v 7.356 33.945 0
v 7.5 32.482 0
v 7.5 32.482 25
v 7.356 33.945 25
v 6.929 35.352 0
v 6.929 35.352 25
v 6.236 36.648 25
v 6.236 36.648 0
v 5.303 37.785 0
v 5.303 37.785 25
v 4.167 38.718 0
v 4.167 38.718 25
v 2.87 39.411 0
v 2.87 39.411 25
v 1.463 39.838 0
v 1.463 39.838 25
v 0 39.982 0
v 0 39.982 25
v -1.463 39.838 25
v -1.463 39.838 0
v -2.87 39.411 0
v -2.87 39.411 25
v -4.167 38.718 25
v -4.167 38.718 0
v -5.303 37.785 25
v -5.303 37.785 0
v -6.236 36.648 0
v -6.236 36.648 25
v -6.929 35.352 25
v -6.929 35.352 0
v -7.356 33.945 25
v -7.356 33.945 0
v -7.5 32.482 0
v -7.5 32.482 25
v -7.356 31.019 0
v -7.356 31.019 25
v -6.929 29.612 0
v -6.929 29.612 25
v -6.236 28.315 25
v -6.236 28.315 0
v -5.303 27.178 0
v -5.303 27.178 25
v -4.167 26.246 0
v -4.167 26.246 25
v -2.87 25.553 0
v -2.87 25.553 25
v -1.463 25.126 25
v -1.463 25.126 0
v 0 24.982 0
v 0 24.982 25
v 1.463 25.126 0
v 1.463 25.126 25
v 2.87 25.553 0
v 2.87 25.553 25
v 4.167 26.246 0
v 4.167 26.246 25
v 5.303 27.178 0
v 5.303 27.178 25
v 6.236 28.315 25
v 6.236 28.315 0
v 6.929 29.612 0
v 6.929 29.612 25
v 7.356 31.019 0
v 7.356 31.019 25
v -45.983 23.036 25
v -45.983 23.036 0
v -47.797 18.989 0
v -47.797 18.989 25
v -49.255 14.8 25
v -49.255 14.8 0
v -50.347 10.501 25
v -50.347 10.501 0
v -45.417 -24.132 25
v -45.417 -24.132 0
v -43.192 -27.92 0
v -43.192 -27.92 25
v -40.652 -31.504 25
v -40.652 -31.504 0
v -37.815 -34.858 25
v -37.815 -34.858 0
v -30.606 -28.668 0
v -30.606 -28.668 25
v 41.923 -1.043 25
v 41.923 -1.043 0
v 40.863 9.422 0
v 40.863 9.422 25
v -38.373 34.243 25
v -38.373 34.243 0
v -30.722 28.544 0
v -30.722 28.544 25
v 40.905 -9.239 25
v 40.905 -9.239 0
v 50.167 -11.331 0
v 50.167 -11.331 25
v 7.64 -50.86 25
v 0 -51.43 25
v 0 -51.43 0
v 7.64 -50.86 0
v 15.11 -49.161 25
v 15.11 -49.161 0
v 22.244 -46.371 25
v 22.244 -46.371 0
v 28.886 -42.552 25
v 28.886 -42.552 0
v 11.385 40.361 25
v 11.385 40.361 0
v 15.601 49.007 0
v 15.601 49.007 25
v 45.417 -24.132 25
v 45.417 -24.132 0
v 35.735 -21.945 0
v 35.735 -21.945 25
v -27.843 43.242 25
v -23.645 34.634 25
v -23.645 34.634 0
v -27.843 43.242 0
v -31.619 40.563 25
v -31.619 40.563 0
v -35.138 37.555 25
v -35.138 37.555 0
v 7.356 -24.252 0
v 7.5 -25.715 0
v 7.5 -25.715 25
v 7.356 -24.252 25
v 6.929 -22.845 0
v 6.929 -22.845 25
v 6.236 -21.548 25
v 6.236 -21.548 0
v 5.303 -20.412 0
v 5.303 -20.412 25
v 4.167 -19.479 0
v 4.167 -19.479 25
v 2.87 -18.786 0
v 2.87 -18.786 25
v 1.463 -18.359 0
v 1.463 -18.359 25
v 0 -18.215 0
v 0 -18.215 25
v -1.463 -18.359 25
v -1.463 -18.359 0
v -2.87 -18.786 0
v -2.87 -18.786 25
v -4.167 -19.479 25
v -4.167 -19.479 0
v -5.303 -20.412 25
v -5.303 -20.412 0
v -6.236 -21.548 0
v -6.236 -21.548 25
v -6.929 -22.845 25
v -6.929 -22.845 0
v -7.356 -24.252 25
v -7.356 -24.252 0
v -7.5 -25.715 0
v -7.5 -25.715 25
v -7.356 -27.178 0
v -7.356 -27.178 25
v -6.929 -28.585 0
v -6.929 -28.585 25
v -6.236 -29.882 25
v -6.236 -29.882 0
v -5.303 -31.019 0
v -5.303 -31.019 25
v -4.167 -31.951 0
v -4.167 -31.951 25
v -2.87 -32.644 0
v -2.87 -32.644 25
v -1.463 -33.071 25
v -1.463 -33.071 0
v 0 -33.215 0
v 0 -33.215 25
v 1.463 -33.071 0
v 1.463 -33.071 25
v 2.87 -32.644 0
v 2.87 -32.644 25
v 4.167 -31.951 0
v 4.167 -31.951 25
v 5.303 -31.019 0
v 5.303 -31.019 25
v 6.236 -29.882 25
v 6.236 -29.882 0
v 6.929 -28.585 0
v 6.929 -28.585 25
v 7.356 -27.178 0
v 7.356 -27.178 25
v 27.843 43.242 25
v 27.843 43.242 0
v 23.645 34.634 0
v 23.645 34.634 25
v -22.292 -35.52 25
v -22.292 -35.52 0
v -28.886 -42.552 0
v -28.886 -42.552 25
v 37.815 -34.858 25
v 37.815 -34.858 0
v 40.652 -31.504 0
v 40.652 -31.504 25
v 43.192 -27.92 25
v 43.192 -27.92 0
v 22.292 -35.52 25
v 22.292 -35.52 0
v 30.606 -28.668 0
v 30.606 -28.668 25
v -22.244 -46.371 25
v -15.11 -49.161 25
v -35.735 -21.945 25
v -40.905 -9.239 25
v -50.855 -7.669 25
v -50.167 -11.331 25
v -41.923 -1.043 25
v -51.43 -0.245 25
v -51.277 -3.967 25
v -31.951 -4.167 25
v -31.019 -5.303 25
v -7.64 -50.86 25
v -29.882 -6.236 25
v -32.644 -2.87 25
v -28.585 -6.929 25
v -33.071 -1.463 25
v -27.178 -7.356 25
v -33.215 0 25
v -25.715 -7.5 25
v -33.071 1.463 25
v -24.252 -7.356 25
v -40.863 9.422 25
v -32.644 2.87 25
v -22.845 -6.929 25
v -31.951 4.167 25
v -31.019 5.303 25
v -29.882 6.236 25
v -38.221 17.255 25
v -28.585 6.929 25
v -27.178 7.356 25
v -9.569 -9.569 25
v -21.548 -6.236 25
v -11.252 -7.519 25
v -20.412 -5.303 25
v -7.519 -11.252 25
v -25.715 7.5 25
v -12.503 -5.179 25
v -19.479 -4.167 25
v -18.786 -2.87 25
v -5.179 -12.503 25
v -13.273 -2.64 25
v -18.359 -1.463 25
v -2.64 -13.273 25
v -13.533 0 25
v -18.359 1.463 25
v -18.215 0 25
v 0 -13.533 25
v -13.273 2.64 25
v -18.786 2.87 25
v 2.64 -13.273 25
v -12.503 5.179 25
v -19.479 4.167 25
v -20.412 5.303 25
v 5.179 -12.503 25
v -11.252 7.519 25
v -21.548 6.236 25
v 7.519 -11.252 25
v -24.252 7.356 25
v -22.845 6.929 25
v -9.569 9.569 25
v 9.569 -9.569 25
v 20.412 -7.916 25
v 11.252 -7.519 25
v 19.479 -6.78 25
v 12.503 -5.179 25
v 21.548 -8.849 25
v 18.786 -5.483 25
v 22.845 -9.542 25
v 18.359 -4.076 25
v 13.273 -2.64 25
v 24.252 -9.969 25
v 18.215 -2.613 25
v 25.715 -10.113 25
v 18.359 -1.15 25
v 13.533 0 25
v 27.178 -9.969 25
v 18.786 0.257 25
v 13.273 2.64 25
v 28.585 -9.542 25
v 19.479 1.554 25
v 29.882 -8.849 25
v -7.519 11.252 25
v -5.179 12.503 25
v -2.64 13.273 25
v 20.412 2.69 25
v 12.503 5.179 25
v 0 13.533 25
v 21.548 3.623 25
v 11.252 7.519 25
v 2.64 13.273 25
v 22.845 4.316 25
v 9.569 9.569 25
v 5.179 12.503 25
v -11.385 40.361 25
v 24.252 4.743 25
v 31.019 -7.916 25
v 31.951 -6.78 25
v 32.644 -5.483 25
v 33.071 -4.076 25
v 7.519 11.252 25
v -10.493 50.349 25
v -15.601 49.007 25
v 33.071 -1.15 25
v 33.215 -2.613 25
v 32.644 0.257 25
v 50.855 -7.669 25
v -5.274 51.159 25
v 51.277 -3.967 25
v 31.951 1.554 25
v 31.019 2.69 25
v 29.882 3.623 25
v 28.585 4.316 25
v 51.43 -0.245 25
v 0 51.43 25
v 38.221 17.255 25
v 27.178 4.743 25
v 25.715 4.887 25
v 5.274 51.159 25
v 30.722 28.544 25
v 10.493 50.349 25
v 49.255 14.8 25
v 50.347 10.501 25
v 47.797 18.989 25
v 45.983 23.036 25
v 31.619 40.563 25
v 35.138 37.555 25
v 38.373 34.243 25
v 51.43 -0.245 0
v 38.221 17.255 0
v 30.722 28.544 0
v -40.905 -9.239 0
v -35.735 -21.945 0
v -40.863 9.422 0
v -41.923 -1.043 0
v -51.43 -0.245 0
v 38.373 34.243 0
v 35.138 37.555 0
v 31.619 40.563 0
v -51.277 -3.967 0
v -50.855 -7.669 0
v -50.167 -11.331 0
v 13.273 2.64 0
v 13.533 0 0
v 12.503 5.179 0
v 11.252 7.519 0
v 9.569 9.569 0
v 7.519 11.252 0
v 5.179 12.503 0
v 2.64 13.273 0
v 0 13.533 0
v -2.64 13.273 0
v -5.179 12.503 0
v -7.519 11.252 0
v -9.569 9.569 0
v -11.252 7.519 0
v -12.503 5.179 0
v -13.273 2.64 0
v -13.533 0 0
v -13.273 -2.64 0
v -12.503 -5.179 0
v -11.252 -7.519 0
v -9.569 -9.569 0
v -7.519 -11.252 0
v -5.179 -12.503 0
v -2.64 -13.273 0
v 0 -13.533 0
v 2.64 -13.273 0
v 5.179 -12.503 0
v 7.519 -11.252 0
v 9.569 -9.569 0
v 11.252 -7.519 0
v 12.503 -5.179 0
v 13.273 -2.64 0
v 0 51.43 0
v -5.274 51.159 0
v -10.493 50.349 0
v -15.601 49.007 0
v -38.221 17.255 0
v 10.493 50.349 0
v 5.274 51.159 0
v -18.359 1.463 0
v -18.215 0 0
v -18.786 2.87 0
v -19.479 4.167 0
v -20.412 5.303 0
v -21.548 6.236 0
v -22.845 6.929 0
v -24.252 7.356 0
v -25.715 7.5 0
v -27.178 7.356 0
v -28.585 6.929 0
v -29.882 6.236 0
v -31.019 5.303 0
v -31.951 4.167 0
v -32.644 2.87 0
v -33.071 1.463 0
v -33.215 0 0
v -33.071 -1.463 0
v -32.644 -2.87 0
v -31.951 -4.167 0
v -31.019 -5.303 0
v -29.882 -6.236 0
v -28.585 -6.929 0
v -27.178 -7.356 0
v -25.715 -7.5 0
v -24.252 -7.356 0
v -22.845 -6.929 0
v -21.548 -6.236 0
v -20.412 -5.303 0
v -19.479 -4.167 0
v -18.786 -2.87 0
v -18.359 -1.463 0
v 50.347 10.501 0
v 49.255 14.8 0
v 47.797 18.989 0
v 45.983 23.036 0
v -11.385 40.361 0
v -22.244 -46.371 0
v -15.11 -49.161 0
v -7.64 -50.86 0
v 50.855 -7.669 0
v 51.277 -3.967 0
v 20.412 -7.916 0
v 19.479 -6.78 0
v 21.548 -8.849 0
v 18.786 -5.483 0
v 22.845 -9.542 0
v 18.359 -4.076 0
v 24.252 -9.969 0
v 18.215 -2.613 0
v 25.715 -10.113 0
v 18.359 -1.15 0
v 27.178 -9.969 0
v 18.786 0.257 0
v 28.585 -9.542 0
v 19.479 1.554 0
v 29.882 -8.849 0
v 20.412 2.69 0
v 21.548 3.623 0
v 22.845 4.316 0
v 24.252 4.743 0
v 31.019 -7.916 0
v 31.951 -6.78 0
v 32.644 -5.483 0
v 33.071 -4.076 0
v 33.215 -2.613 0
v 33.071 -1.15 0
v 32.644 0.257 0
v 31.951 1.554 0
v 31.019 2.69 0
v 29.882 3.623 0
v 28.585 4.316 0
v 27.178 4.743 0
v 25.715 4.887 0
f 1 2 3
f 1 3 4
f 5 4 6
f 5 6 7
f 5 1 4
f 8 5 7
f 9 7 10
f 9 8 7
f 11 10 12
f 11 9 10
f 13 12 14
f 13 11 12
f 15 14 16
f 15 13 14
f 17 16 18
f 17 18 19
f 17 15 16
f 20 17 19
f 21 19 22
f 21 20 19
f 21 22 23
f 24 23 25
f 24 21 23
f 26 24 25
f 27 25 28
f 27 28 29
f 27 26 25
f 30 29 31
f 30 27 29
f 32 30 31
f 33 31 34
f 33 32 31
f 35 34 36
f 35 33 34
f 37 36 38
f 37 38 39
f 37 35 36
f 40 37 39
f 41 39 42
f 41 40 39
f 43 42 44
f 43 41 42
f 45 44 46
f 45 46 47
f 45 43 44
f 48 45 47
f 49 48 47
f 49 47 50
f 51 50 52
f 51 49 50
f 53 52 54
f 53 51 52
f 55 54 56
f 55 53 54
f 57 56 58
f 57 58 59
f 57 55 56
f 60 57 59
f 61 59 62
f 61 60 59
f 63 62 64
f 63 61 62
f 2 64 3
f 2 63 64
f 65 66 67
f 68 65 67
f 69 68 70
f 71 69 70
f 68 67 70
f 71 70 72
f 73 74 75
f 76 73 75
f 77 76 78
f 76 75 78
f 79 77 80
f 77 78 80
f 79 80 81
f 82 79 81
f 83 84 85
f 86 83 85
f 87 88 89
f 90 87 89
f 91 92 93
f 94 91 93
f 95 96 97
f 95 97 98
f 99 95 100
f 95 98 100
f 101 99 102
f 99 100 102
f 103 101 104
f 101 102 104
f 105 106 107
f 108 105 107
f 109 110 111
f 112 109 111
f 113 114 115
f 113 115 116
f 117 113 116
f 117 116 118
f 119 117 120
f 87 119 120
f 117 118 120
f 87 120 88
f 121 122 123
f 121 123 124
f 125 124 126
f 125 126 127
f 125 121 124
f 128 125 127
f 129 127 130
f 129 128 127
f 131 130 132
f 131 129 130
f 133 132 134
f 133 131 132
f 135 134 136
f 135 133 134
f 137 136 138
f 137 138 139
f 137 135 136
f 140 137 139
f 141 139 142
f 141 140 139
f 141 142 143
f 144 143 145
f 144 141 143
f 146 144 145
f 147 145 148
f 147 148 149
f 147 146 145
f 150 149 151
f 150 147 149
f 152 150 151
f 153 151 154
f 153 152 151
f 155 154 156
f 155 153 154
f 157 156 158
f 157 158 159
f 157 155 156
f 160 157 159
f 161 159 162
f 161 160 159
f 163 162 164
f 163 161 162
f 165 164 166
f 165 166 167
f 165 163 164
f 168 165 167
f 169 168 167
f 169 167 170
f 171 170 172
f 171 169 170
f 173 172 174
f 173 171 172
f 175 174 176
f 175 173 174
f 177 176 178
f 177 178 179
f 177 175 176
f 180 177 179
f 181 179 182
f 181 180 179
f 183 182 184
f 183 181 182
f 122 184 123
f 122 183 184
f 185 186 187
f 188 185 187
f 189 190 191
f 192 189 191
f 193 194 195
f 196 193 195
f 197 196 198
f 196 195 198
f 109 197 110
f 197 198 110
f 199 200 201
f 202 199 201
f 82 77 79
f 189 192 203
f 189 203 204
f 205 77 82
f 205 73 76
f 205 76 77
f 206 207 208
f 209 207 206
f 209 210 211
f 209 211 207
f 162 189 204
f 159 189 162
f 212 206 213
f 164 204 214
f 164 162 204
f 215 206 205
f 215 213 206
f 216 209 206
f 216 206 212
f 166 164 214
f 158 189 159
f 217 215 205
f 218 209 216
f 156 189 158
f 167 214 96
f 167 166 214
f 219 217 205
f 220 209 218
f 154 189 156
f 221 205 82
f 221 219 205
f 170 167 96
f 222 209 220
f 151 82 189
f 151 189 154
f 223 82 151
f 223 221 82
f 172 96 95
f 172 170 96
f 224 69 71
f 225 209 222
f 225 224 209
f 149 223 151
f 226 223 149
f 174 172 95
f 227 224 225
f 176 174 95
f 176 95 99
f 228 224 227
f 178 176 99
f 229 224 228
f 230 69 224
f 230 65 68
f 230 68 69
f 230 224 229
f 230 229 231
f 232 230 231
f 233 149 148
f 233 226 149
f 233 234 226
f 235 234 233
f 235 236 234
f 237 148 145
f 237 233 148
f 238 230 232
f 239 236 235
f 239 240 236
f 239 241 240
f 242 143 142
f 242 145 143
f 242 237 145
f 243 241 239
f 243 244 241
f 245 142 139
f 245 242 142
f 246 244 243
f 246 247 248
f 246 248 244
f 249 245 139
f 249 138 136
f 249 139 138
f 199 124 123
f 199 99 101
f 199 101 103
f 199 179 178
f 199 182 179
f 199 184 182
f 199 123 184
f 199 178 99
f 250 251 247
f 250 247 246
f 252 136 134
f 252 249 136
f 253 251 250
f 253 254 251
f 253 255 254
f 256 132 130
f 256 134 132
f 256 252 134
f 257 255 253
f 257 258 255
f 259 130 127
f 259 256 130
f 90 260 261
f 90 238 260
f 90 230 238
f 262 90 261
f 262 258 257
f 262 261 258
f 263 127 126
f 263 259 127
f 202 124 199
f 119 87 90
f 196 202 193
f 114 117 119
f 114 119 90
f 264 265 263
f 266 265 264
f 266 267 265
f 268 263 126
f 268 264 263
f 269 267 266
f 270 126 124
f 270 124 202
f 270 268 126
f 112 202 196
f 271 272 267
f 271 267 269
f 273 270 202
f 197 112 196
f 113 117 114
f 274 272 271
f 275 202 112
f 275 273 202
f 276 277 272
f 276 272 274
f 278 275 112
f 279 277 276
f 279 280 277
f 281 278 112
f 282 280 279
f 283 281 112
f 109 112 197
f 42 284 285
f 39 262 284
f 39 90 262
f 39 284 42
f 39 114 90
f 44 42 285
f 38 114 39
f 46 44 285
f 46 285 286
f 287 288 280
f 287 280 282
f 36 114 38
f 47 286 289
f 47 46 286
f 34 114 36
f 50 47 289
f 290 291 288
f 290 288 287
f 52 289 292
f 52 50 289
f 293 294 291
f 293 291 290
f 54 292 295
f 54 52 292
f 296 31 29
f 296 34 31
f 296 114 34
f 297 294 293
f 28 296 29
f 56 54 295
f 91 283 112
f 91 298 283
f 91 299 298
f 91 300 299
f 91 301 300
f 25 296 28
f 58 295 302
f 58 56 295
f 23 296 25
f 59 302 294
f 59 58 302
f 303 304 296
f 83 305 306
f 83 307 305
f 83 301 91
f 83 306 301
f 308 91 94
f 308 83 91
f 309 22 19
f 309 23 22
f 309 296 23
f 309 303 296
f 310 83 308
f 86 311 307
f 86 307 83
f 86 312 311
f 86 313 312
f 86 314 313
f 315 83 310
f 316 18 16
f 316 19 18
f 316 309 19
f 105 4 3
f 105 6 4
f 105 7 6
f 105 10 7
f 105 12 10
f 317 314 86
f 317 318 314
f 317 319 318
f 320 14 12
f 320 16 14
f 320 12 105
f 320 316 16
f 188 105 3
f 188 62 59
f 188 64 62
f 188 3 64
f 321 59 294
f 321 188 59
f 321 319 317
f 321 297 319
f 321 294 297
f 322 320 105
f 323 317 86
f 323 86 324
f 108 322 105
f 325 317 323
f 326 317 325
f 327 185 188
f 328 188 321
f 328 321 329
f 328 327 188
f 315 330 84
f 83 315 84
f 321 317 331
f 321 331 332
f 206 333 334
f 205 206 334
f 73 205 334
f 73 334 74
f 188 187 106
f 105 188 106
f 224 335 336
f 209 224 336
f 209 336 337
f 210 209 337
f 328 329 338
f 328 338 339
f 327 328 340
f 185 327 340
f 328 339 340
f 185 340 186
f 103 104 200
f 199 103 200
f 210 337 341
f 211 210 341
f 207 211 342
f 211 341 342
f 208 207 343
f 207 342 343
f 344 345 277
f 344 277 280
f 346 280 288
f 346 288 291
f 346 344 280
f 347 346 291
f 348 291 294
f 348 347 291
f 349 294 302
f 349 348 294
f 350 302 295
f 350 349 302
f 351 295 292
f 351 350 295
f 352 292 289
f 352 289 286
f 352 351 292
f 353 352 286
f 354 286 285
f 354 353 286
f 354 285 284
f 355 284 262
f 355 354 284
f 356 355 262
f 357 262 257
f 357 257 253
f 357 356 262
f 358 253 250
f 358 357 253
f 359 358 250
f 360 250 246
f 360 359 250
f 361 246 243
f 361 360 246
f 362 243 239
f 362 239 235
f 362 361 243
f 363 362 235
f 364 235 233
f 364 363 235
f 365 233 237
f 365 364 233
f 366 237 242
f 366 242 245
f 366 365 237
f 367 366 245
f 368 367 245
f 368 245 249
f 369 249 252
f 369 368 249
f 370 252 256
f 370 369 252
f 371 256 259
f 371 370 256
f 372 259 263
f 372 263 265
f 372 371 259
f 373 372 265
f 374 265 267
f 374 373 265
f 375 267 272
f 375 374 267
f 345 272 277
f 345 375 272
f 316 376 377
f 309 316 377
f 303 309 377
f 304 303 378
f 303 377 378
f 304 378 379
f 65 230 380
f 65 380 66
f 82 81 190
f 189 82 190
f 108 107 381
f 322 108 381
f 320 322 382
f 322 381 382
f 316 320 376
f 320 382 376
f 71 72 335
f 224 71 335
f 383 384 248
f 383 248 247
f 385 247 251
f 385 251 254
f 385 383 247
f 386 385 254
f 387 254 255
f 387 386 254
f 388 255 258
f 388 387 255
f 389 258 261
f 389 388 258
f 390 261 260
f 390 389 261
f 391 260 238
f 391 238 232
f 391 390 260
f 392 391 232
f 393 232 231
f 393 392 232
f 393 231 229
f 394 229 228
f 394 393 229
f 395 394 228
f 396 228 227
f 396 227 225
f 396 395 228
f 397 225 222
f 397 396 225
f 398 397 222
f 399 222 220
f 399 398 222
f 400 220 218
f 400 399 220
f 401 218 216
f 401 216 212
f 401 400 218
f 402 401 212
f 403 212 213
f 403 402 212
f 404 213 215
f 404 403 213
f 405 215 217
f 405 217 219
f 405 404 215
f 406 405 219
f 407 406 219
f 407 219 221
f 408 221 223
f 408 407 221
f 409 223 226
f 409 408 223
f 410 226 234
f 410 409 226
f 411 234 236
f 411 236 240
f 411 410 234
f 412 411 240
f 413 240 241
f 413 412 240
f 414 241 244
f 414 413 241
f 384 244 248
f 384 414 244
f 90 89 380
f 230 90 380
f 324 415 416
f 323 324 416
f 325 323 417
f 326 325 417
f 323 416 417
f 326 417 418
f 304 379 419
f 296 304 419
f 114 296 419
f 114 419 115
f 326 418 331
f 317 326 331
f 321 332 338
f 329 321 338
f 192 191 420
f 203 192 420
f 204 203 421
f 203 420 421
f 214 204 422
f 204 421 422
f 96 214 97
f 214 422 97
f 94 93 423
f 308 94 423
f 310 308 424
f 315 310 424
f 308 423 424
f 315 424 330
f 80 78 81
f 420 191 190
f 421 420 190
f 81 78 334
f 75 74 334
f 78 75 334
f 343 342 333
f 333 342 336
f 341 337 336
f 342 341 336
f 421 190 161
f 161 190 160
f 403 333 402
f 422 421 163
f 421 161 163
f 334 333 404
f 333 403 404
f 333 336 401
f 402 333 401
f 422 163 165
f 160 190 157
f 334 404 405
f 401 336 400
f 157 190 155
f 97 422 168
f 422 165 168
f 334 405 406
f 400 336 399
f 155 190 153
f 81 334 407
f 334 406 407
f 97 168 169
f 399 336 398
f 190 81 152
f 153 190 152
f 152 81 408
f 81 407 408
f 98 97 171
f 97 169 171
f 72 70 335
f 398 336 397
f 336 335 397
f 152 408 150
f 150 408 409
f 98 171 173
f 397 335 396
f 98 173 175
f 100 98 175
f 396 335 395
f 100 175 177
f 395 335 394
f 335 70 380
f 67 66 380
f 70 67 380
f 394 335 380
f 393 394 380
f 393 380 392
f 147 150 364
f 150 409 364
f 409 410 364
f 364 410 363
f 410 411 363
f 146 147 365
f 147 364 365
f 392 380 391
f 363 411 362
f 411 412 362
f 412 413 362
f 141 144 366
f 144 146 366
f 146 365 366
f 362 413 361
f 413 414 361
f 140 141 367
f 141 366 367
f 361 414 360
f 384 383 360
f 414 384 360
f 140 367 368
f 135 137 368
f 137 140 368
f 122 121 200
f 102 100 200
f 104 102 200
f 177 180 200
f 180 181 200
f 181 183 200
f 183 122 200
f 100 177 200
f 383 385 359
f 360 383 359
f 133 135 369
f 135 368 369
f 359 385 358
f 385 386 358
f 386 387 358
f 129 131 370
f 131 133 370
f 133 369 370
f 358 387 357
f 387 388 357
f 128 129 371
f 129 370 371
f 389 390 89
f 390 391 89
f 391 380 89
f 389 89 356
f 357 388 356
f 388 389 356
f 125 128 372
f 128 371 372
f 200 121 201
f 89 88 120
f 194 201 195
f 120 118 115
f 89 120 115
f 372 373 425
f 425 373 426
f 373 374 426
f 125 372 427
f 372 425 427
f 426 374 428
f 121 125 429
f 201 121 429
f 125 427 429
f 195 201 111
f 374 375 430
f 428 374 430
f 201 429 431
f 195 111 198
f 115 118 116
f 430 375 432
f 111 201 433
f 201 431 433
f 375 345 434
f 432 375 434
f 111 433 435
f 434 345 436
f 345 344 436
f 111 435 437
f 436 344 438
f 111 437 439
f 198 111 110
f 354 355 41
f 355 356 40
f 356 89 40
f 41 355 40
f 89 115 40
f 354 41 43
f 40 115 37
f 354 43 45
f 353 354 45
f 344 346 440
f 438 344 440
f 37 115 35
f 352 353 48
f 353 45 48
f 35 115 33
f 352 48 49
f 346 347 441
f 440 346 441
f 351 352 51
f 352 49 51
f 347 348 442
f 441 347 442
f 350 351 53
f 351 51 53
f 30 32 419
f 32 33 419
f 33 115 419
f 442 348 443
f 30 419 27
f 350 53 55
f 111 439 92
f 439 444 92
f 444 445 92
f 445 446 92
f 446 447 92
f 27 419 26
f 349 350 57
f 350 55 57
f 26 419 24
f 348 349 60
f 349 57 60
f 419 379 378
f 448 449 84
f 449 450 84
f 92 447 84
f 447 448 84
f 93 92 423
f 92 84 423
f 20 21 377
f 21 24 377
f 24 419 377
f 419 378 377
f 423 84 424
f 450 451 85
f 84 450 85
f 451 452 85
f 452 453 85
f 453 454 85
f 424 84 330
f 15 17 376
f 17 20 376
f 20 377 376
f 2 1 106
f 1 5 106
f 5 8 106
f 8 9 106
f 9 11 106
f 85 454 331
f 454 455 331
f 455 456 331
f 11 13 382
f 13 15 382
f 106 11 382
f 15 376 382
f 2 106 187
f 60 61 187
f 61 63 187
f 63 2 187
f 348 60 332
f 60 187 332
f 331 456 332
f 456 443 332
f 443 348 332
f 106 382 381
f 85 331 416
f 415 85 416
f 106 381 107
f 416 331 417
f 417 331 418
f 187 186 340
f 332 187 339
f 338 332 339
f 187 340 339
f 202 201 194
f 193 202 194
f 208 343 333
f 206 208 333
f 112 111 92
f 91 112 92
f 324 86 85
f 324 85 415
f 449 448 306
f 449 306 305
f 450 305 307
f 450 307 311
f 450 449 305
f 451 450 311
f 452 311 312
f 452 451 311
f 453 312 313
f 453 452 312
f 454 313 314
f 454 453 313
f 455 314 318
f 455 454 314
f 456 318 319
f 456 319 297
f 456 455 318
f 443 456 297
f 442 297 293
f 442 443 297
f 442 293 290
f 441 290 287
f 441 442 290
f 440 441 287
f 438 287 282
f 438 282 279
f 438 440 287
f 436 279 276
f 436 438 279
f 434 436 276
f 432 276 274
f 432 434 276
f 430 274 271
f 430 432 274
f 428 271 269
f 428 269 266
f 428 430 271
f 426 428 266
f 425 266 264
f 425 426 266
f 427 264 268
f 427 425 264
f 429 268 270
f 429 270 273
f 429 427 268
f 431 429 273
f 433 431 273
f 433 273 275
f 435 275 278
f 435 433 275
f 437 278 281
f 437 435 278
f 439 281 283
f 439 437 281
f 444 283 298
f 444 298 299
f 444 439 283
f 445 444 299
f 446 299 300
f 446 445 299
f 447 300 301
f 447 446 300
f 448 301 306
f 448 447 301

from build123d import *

# Parameters (mm, degrees)
F0_R     = 7.5
F0_R_2   = 13.533
F1_DEPTH = 25
F2_DEPTH = 0.4
F3_DEPTH = 25


with BuildPart() as f1:
    # F0 (on Top) → F1 (new body)
    with BuildSketch(Plane.XY):
        with BuildLine():
            ThreePointArc((-28.885683, -42.552377), (-15.109618, -49.160827), (0, -51.430414))
            ThreePointArc((0, -51.430414), (15.109618, -49.160827), (28.885683, -42.552377))
            Line((28.885683, -42.552377), (22.292488, -35.519605))
            Line((22.292488, -35.519605), (30.606489, -28.667756))
            Line((30.606489, -28.667756), (37.815153, -34.858308))
            ThreePointArc((37.815153, -34.858308), (41.960361, -29.739125), (45.41727, -24.132116))
            Line((45.41727, -24.132116), (35.735177, -21.945261))
            Line((35.735177, -21.945261), (40.905213, -9.239094))
            Line((40.905213, -9.239094), (50.166693, -11.330947))
            ThreePointArc((50.166693, -11.330947), (51.099803, -5.82216), (51.429832, -0.24466))
            Line((51.429832, -0.24466), (41.922666, -1.042791))
            Line((41.922666, -1.042791), (40.863441, 9.422129))
            Line((40.863441, 9.422129), (50.346898, 10.5013))
            ThreePointArc((50.346898, 10.5013), (48.5709, 16.910209), (45.982751, 23.036363))
            Line((45.982751, 23.036363), (38.221147, 17.255182))
            Line((38.221147, 17.255182), (30.721983, 28.543951))
            Line((30.721983, 28.543951), (38.373263, 34.242958))
            ThreePointArc((38.373263, 34.242958), (33.412506, 39.09849), (27.843076, 43.241769))
            Line((27.843076, 43.241769), (23.645456, 34.633651))
            Line((23.645456, 34.633651), (11.384548, 40.360741))
            Line((11.384548, 40.360741), (15.600841, 49.007155))
            ThreePointArc((15.600841, 49.007155), (7.89396, 50.820988), (0, 51.430414))
            ThreePointArc((0, 51.430414), (-7.89396, 50.820988), (-15.600841, 49.007155))
            Line((-15.600841, 49.007155), (-11.384548, 40.360741))
            Line((-11.384548, 40.360741), (-23.645456, 34.633651))
            Line((-23.645456, 34.633651), (-27.843076, 43.241769))
            ThreePointArc((-27.843076, 43.241769), (-33.412506, 39.09849), (-38.373263, 34.242958))
            Line((-38.373263, 34.242958), (-30.721983, 28.543951))
            Line((-30.721983, 28.543951), (-38.221147, 17.255182))
            Line((-38.221147, 17.255182), (-45.982751, 23.036363))
            ThreePointArc((-45.982751, 23.036363), (-48.5709, 16.910209), (-50.346898, 10.5013))
            Line((-50.346898, 10.5013), (-40.863441, 9.422129))
            Line((-40.863441, 9.422129), (-41.922666, -1.042791))
            Line((-41.922666, -1.042791), (-51.429832, -0.24466))
            ThreePointArc((-51.429832, -0.24466), (-51.099803, -5.82216), (-50.166693, -11.330947))
            Line((-50.166693, -11.330947), (-40.905213, -9.239094))
            Line((-40.905213, -9.239094), (-35.735177, -21.945261))
            Line((-35.735177, -21.945261), (-45.41727, -24.132116))
            ThreePointArc((-45.41727, -24.132116), (-41.960361, -29.739125), (-37.815153, -34.858308))
            Line((-37.815153, -34.858308), (-30.606489, -28.667756))
            Line((-30.606489, -28.667756), (-22.292488, -35.519605))
            Line((-22.292488, -35.519605), (-28.885683, -42.552377))
        make_face()
        with Locations((-25.715207, 0)):
            Circle(F0_R, mode=Mode.SUBTRACT)
        with Locations((0, -25.715207)):
            Circle(F0_R, mode=Mode.SUBTRACT)
        Circle(F0_R_2, mode=Mode.SUBTRACT)
        with Locations((25.715207, -2.612802)):
            Circle(F0_R, mode=Mode.SUBTRACT)
        with Locations((0, 32.481707)):
            Circle(F0_R, mode=Mode.SUBTRACT)
    extrude(amount=F1_DEPTH)

    # F0 (on Top) → F2 (cut)
    with BuildSketch(Plane.XY):
        Circle(F0_R_2)
    extrude(amount=-F2_DEPTH, mode=Mode.SUBTRACT)

    # F0 (on Top) → F3 (cut)
    with BuildSketch(Plane.XY):
        with Locations((0, 32.481707)):
            Circle(F0_R)
        with Locations((-25.715207, 0)):
            Circle(F0_R)
        with Locations((25.715207, -2.612802)):
            Circle(F0_R)
        with Locations((0, -25.715207)):
            Circle(F0_R)
    extrude(amount=-F3_DEPTH, mode=Mode.SUBTRACT)


solid = f1.part
